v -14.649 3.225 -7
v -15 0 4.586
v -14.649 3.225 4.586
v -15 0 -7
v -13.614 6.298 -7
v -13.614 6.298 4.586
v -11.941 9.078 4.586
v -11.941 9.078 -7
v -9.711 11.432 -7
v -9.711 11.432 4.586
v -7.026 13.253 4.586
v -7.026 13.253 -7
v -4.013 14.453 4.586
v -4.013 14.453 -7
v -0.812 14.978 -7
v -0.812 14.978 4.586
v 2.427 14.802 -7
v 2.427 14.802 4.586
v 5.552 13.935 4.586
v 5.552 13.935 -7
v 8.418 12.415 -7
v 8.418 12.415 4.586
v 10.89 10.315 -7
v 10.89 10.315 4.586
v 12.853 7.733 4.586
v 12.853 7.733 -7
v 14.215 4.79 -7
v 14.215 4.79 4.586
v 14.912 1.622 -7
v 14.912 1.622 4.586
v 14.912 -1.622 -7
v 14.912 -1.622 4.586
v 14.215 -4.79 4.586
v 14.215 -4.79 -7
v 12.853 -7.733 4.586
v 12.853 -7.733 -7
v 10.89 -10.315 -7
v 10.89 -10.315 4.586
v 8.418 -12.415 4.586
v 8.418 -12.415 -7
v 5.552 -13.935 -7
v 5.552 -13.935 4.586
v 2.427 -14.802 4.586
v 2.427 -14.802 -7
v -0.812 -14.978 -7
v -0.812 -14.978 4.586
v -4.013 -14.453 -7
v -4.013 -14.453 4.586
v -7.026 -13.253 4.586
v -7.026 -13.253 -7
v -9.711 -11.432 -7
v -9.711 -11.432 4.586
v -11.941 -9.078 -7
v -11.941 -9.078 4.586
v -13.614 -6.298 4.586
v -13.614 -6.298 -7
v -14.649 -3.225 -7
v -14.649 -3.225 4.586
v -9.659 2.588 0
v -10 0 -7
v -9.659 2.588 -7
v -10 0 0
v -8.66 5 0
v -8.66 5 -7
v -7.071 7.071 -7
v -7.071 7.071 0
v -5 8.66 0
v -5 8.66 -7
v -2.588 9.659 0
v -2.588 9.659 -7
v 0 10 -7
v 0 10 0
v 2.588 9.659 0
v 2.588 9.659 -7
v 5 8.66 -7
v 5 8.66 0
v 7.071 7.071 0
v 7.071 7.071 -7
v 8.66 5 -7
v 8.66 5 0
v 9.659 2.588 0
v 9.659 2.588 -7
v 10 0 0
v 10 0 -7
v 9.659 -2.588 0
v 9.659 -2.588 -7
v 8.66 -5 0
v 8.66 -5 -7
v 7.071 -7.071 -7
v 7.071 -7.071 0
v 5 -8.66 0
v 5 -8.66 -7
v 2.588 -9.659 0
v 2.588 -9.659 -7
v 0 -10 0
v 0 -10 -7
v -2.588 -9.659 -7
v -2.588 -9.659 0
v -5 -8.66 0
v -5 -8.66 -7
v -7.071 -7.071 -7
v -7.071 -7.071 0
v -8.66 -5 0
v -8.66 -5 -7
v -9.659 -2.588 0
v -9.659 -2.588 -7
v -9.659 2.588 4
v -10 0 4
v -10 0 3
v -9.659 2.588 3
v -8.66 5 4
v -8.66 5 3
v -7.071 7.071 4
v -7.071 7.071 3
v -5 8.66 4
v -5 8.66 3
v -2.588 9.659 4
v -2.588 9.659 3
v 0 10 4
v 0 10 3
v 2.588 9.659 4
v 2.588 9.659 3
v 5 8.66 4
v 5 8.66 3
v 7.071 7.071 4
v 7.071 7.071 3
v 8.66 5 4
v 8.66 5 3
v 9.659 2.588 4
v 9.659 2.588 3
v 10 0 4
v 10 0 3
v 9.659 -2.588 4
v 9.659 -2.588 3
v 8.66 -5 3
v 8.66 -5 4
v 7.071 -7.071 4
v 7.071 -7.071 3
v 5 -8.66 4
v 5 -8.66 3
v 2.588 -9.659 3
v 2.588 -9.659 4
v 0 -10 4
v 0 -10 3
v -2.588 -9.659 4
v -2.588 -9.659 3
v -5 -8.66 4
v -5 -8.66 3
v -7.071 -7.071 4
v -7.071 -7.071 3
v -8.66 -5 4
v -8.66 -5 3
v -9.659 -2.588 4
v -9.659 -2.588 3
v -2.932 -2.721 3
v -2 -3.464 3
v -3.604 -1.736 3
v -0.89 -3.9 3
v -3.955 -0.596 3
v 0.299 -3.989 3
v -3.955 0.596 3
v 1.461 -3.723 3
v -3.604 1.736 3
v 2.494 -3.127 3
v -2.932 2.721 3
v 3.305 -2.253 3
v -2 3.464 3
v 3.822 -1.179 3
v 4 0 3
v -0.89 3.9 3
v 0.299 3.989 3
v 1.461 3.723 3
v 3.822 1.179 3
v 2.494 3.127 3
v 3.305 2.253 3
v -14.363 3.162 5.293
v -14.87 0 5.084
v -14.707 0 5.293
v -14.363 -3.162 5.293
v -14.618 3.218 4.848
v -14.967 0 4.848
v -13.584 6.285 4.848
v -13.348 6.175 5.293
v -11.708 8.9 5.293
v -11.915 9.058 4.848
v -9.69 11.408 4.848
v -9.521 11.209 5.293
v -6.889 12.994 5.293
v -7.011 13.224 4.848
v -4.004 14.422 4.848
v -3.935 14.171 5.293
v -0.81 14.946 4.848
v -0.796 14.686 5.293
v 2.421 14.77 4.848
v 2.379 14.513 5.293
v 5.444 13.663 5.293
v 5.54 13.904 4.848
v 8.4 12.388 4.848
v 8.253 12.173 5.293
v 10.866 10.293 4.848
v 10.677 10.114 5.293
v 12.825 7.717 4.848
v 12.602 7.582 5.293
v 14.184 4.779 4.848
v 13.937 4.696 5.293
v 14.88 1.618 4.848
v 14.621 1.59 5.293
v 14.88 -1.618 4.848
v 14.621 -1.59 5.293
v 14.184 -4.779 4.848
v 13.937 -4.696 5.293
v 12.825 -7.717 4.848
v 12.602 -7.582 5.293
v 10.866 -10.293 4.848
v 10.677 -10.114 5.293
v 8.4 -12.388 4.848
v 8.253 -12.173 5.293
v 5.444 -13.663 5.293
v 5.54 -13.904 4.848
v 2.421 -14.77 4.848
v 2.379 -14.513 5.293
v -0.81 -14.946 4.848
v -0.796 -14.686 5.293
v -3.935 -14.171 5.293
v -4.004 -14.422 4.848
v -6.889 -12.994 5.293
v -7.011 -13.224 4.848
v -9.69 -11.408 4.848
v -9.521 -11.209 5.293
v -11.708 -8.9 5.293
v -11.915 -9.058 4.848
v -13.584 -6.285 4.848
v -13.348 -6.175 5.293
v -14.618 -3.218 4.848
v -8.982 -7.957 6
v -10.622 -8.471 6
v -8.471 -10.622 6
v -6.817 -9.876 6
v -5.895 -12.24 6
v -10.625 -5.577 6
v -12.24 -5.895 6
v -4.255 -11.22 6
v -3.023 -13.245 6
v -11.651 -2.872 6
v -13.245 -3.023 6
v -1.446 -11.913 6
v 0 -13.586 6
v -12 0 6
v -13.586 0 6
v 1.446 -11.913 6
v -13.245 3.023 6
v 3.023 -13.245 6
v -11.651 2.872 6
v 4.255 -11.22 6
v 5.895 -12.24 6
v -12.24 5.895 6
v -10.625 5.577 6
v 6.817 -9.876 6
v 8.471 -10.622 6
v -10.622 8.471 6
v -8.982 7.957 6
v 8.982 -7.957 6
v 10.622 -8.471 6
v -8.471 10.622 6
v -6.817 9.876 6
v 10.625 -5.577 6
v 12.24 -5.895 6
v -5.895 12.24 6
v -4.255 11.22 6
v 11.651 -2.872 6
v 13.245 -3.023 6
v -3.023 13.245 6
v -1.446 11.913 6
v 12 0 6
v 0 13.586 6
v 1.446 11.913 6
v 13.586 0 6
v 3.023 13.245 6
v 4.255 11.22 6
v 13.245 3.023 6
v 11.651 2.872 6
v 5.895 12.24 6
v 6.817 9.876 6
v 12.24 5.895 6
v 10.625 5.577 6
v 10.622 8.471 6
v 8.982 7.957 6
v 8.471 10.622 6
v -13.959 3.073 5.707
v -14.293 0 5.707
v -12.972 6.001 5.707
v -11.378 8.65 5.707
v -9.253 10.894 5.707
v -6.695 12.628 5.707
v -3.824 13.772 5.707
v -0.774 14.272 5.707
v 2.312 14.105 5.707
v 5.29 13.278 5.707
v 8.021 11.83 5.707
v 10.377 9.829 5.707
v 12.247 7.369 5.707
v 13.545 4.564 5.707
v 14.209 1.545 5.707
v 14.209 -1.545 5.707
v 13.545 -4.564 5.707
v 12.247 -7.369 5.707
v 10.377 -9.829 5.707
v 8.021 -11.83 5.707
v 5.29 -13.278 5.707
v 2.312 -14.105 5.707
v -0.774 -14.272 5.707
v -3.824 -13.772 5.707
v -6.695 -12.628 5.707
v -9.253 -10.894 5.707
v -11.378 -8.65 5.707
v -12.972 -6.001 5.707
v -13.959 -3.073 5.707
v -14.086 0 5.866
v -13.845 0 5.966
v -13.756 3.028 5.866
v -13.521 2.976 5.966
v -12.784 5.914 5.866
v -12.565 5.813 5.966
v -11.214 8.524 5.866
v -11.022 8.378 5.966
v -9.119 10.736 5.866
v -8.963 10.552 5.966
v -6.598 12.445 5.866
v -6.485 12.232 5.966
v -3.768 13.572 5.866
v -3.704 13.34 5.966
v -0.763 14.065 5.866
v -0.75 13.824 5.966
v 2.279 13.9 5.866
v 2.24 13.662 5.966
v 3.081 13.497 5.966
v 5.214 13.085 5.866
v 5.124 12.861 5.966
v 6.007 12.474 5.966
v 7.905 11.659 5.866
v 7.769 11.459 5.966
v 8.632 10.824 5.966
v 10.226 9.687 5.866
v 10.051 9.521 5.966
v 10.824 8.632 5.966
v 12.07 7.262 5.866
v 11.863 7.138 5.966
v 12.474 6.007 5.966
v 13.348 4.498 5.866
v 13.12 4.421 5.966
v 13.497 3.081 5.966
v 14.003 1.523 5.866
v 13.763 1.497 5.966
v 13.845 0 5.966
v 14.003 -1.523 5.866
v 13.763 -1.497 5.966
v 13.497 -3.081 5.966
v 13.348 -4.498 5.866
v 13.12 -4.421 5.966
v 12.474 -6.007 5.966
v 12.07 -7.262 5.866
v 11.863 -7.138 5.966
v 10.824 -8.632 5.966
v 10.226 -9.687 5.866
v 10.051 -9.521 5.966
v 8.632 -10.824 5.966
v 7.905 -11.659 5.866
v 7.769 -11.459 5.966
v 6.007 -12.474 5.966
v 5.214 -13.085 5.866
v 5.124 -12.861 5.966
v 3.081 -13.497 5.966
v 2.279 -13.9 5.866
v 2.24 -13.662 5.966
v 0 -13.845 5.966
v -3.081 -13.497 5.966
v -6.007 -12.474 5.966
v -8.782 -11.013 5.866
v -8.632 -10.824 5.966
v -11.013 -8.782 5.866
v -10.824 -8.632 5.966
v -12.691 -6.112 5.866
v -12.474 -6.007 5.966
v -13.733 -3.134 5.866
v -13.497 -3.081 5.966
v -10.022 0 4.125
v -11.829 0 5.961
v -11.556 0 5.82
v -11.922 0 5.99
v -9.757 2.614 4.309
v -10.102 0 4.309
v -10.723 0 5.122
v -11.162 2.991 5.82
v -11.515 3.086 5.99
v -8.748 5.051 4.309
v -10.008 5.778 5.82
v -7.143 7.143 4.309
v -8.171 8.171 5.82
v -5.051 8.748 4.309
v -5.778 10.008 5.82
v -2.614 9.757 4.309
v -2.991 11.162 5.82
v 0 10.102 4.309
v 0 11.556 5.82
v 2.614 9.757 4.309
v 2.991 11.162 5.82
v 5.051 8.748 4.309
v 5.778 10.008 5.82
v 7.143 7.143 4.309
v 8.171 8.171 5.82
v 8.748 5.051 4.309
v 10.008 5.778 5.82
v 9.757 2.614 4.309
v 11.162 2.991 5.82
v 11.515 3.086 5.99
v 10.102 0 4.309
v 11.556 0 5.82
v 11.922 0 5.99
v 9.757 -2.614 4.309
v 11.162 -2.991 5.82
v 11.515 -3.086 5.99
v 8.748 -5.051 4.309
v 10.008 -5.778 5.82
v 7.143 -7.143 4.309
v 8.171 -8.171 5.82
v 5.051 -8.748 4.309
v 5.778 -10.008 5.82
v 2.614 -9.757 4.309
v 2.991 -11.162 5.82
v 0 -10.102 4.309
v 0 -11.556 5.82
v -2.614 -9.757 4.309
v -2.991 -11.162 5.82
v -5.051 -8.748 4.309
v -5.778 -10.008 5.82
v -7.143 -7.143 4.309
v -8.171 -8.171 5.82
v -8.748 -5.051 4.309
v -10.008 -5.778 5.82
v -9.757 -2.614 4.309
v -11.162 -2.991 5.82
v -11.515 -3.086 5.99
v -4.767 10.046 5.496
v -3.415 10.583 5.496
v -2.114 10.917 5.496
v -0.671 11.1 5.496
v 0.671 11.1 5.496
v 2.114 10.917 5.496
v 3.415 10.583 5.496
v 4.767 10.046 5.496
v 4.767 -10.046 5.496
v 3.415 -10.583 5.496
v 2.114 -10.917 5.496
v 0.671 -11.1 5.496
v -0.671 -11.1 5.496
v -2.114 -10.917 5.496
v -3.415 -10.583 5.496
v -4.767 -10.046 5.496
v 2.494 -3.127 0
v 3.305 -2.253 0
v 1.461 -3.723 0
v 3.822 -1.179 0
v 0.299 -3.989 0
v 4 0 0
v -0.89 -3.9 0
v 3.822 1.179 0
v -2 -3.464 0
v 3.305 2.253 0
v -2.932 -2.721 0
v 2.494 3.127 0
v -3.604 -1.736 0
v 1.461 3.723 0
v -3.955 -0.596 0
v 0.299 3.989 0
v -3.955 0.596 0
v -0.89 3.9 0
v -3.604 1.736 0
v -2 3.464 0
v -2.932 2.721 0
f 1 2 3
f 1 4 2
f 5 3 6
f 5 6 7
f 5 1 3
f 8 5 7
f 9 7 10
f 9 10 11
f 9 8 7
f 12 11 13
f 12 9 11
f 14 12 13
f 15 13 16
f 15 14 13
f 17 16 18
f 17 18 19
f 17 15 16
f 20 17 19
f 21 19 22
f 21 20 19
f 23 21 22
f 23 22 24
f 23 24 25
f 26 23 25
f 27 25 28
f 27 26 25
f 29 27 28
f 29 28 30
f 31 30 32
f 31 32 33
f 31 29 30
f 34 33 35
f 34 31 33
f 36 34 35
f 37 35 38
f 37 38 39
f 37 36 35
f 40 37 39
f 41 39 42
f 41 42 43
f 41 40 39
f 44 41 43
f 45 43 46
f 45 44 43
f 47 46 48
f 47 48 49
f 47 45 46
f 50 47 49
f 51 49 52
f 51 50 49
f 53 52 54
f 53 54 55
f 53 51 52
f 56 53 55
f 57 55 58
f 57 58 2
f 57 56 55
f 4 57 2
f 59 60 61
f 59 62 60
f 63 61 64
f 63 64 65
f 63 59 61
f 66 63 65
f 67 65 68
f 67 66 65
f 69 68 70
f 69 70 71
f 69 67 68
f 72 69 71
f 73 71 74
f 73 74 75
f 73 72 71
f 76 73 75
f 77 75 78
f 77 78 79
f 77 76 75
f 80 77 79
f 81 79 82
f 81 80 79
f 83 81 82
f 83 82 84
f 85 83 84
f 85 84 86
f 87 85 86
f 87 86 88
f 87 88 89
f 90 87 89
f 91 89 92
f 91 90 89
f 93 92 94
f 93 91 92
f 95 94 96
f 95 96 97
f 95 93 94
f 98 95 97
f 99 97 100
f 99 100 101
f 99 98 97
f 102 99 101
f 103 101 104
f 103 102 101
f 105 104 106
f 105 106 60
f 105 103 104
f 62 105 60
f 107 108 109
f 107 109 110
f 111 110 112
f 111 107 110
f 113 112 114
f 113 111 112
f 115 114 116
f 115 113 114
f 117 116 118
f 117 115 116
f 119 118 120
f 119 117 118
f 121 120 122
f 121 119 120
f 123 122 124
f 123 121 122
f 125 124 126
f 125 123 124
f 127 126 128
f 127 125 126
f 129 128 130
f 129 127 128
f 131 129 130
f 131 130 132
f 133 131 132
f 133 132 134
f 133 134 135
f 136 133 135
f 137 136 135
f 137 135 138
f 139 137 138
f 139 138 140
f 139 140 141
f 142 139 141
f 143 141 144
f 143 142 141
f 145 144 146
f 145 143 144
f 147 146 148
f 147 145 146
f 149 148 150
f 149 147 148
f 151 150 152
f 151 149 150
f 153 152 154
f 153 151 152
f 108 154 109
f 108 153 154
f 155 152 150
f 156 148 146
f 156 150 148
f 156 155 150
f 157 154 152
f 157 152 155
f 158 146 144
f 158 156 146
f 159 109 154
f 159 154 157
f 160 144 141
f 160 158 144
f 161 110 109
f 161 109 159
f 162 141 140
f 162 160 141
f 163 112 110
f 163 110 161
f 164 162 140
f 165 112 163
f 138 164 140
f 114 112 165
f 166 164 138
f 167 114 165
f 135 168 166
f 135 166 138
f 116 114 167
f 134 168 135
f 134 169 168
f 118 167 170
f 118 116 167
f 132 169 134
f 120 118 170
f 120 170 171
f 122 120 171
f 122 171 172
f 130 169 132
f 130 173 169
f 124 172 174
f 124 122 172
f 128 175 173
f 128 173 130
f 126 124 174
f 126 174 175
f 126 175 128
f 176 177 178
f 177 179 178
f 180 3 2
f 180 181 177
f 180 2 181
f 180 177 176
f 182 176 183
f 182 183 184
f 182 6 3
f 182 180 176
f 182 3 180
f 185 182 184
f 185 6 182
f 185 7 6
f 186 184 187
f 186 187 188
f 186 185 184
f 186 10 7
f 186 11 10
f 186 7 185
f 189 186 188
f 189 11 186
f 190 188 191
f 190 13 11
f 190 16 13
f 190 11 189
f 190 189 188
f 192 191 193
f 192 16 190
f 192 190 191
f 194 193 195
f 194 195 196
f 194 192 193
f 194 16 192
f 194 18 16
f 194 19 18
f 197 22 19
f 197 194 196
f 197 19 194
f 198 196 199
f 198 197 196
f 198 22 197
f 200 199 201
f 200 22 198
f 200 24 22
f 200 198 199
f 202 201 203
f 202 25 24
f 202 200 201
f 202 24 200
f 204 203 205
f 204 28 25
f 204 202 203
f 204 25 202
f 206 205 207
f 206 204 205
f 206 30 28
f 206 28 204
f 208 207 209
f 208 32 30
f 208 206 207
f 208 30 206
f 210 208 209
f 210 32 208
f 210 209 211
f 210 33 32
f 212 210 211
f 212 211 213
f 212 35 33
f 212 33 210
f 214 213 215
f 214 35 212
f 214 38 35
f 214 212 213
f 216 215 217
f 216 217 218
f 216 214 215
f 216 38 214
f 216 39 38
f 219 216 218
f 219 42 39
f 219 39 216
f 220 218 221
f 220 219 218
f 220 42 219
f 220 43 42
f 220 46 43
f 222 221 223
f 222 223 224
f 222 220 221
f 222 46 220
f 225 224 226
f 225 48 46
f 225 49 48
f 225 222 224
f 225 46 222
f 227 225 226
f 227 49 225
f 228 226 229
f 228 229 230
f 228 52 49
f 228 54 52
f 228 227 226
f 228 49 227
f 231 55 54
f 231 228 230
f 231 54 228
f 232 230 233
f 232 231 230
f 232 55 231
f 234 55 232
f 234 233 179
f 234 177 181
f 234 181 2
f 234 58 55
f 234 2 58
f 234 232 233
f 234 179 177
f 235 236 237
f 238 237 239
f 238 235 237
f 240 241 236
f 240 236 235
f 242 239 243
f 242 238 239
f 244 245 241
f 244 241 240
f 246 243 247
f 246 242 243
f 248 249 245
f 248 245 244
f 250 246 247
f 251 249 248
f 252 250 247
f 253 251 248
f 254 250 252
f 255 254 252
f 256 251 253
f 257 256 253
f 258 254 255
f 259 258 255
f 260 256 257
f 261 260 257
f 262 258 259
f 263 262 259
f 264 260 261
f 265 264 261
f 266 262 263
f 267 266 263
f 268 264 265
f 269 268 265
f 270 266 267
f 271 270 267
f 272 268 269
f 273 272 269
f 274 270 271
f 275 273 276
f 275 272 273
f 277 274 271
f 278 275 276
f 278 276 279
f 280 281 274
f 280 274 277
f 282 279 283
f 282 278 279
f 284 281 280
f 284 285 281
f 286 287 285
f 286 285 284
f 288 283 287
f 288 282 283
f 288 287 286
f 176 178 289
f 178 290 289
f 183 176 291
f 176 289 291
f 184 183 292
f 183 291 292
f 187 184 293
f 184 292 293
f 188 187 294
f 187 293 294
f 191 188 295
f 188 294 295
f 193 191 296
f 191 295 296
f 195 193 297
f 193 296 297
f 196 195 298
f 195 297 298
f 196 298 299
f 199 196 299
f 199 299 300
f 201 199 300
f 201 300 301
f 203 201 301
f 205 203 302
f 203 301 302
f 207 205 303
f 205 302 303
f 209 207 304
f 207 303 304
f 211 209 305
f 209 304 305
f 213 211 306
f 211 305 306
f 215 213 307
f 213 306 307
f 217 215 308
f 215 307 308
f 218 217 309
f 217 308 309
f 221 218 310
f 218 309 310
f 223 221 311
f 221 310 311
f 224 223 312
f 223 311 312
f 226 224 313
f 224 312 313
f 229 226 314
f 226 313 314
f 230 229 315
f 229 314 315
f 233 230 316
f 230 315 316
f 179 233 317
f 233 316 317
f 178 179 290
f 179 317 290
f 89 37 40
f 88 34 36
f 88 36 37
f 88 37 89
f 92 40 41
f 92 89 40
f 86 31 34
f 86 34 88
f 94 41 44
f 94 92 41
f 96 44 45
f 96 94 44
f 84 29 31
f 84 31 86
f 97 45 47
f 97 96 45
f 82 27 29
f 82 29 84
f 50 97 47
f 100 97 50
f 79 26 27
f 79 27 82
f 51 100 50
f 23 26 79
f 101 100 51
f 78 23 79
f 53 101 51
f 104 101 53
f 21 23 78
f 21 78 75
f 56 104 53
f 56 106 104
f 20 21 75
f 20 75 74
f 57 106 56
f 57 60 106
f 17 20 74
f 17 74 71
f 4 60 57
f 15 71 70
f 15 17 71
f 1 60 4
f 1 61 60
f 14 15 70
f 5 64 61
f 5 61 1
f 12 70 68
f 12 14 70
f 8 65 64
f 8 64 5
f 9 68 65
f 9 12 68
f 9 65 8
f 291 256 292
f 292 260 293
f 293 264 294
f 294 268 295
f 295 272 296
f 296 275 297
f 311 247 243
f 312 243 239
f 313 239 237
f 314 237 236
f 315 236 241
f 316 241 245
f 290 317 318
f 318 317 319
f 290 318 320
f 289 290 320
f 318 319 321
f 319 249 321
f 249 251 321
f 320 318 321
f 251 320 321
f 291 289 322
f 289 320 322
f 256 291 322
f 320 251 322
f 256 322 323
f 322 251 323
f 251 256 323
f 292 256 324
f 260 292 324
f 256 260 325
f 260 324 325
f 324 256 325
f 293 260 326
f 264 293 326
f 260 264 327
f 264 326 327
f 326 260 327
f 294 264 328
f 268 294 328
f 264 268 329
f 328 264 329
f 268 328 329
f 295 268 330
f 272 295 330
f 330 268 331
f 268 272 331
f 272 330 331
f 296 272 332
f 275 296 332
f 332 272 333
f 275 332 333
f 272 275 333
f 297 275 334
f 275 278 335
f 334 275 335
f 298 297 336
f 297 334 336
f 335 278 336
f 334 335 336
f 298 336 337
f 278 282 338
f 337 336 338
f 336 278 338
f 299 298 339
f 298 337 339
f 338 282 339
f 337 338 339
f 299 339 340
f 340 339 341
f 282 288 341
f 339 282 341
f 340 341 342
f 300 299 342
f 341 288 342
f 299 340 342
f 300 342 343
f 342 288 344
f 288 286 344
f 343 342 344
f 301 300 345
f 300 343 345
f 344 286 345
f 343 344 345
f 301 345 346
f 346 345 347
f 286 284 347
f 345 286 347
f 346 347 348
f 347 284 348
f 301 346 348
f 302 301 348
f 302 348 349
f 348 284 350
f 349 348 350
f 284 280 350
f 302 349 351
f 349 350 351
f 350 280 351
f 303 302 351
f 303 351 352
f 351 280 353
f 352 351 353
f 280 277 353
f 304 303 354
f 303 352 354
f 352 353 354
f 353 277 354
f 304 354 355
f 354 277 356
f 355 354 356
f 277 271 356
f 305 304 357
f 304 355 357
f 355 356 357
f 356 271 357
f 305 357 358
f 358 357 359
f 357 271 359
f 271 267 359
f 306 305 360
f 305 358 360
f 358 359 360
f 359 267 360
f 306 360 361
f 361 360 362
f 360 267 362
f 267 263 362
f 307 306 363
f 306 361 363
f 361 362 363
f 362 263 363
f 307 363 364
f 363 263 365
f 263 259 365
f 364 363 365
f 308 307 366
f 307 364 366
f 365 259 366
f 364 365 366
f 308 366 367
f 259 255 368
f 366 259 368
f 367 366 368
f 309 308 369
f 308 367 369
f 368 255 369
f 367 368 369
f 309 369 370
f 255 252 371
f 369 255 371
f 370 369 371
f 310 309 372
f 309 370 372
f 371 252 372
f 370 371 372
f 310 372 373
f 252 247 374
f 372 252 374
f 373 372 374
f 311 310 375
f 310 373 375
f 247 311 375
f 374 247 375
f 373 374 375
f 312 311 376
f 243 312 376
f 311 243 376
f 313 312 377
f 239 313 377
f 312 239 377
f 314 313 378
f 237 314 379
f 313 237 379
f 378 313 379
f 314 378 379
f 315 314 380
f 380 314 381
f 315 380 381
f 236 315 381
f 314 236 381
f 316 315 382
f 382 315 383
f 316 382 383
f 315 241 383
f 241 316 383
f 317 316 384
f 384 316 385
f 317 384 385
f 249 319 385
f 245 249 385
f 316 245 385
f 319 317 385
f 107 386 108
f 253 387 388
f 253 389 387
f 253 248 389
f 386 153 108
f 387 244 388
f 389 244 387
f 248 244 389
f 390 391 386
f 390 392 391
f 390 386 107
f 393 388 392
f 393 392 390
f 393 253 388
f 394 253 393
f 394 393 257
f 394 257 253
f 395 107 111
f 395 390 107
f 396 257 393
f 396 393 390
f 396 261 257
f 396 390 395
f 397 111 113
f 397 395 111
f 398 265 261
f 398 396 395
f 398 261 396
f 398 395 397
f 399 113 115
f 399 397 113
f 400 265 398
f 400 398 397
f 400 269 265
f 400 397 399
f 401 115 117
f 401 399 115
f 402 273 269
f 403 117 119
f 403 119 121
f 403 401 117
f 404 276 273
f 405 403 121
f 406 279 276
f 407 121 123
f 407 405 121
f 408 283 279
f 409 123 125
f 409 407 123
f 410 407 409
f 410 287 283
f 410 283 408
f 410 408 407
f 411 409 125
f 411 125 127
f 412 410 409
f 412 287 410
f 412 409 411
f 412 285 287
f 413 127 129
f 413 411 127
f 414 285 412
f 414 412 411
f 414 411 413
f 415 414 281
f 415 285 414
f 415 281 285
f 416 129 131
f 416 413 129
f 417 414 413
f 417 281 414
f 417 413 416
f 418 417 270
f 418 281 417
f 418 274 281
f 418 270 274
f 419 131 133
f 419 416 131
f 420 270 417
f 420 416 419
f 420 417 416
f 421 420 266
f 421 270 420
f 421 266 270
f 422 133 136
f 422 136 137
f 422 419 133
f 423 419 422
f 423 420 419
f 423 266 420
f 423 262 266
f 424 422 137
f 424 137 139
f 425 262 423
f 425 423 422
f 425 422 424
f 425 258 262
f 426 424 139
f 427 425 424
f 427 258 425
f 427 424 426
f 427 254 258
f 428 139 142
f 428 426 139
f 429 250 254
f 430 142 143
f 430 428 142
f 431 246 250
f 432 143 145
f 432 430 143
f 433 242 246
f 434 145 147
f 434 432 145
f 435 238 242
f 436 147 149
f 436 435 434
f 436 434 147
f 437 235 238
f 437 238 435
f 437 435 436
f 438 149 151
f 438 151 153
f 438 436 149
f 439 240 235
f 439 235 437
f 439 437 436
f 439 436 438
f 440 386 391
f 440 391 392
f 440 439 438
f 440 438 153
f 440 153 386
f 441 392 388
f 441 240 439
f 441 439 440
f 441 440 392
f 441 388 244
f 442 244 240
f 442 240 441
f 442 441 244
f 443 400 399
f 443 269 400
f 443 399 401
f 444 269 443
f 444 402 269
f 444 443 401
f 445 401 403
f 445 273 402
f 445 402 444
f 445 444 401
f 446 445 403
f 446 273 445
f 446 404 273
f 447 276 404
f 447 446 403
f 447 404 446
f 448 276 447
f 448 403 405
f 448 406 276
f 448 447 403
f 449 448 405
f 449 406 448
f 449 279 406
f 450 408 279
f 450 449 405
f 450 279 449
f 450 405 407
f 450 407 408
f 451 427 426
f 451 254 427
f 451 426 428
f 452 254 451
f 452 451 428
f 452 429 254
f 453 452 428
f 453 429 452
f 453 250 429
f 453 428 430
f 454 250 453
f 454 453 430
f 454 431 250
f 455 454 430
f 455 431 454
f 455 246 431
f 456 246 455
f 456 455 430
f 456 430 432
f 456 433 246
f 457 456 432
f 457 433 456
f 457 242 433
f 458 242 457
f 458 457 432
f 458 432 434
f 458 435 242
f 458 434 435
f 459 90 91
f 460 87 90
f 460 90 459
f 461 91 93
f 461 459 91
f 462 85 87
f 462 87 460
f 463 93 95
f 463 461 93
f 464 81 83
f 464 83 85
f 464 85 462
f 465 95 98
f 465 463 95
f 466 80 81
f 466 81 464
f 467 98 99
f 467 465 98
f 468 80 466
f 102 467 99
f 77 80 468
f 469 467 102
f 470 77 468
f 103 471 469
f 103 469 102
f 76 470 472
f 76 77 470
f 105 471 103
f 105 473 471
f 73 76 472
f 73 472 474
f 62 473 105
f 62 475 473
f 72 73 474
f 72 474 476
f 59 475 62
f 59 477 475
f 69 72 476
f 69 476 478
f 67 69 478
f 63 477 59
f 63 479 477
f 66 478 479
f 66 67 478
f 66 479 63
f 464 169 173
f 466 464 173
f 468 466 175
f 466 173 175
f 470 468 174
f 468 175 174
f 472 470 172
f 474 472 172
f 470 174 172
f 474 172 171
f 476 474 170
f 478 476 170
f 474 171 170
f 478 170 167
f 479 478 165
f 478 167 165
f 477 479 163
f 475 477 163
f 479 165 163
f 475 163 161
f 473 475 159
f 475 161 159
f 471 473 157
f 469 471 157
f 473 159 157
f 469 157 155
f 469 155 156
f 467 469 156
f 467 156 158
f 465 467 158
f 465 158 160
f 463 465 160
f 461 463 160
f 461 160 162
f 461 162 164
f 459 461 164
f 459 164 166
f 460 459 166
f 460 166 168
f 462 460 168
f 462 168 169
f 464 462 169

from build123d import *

# Parameters (mm, degrees)
F2_R     = 4
F3_DEPTH = 25
F5_SIZE  = 1
F6_R     = 1


# Not quite as in the source:
# - a fillet or chamfer that OpenCascade refuses, or shapes differently, is made with other operations: its cross-section is extruded or revolved along the edge and cut away or added


with BuildPart() as f1:
    # F0 (on Front) → F1 (revolve)
    with BuildSketch(Plane.XZ):
        Polygon((-10, 0), (0, 0), (0, 3), (-10, 3), (-10, 6), (-15, 6), (-15, -7), (-10, -7), align=None)
    revolve(axis=Axis((0, 0, 1.5), (0, 0, -1)))

    # F2 (on face) → F3 (cut)
    with BuildSketch(Plane.XY.offset(3)):
        Circle(F2_R)
    extrude(amount=-F3_DEPTH, mode=Mode.SUBTRACT)

    # F4: fillet of radius 2 on 1 edges, made by hand

    # F4_s1 → F4_t2 (revolve, cut)
    with BuildSketch(Plane.XZ):
        with BuildLine():
            add(Edge.make_bspline(
                [(-10, 4), (-10, 6), (-12, 6)],
                knots=[0, 0, 0, 1, 1, 1], degree=2, weights=[1, 0.25, 1]))
            Line((-12, 6), (-10, 6))
            Line((-10, 6), (-10, 4))
        make_face()
    revolve(axis=Axis((0, 0, 6), (0, 0, -1)), mode=Mode.SUBTRACT)

    # F5
    f5_edges = [f1.edges().sort_by_distance(p)[0] for p in [
        (15, 0, 6),
    ]]
    chamfer(f5_edges, length=F5_SIZE)

    # F6
    f6_edges = [f1.edges().sort_by_distance(p)[0] for p in [
        (14, 0, 6),
    ]]
    fillet(f6_edges, radius=F6_R)

    # F7: fillet of radius 1 on 1 edges, made by hand

    # F7_s1 → F7_t2 (revolve, cut)
    with BuildSketch(Plane.XZ):
        with BuildLine():
            add(Edge.make_bspline(
                [(-14.7071067812, 5.2928932188), (-15, 5), (-15, 4.5857864376)],
                knots=[0, 0, 0, 1, 1, 1], degree=2, weights=[1, 1, 1]))
            Line((-15, 4.5857864376), (-15, 5))
            Line((-15, 5), (-14.7071067812, 5.2928932188))
        make_face()
    revolve(axis=Axis((0, 0, 5), (0, 0, -1)), mode=Mode.SUBTRACT)


solid = f1.part
